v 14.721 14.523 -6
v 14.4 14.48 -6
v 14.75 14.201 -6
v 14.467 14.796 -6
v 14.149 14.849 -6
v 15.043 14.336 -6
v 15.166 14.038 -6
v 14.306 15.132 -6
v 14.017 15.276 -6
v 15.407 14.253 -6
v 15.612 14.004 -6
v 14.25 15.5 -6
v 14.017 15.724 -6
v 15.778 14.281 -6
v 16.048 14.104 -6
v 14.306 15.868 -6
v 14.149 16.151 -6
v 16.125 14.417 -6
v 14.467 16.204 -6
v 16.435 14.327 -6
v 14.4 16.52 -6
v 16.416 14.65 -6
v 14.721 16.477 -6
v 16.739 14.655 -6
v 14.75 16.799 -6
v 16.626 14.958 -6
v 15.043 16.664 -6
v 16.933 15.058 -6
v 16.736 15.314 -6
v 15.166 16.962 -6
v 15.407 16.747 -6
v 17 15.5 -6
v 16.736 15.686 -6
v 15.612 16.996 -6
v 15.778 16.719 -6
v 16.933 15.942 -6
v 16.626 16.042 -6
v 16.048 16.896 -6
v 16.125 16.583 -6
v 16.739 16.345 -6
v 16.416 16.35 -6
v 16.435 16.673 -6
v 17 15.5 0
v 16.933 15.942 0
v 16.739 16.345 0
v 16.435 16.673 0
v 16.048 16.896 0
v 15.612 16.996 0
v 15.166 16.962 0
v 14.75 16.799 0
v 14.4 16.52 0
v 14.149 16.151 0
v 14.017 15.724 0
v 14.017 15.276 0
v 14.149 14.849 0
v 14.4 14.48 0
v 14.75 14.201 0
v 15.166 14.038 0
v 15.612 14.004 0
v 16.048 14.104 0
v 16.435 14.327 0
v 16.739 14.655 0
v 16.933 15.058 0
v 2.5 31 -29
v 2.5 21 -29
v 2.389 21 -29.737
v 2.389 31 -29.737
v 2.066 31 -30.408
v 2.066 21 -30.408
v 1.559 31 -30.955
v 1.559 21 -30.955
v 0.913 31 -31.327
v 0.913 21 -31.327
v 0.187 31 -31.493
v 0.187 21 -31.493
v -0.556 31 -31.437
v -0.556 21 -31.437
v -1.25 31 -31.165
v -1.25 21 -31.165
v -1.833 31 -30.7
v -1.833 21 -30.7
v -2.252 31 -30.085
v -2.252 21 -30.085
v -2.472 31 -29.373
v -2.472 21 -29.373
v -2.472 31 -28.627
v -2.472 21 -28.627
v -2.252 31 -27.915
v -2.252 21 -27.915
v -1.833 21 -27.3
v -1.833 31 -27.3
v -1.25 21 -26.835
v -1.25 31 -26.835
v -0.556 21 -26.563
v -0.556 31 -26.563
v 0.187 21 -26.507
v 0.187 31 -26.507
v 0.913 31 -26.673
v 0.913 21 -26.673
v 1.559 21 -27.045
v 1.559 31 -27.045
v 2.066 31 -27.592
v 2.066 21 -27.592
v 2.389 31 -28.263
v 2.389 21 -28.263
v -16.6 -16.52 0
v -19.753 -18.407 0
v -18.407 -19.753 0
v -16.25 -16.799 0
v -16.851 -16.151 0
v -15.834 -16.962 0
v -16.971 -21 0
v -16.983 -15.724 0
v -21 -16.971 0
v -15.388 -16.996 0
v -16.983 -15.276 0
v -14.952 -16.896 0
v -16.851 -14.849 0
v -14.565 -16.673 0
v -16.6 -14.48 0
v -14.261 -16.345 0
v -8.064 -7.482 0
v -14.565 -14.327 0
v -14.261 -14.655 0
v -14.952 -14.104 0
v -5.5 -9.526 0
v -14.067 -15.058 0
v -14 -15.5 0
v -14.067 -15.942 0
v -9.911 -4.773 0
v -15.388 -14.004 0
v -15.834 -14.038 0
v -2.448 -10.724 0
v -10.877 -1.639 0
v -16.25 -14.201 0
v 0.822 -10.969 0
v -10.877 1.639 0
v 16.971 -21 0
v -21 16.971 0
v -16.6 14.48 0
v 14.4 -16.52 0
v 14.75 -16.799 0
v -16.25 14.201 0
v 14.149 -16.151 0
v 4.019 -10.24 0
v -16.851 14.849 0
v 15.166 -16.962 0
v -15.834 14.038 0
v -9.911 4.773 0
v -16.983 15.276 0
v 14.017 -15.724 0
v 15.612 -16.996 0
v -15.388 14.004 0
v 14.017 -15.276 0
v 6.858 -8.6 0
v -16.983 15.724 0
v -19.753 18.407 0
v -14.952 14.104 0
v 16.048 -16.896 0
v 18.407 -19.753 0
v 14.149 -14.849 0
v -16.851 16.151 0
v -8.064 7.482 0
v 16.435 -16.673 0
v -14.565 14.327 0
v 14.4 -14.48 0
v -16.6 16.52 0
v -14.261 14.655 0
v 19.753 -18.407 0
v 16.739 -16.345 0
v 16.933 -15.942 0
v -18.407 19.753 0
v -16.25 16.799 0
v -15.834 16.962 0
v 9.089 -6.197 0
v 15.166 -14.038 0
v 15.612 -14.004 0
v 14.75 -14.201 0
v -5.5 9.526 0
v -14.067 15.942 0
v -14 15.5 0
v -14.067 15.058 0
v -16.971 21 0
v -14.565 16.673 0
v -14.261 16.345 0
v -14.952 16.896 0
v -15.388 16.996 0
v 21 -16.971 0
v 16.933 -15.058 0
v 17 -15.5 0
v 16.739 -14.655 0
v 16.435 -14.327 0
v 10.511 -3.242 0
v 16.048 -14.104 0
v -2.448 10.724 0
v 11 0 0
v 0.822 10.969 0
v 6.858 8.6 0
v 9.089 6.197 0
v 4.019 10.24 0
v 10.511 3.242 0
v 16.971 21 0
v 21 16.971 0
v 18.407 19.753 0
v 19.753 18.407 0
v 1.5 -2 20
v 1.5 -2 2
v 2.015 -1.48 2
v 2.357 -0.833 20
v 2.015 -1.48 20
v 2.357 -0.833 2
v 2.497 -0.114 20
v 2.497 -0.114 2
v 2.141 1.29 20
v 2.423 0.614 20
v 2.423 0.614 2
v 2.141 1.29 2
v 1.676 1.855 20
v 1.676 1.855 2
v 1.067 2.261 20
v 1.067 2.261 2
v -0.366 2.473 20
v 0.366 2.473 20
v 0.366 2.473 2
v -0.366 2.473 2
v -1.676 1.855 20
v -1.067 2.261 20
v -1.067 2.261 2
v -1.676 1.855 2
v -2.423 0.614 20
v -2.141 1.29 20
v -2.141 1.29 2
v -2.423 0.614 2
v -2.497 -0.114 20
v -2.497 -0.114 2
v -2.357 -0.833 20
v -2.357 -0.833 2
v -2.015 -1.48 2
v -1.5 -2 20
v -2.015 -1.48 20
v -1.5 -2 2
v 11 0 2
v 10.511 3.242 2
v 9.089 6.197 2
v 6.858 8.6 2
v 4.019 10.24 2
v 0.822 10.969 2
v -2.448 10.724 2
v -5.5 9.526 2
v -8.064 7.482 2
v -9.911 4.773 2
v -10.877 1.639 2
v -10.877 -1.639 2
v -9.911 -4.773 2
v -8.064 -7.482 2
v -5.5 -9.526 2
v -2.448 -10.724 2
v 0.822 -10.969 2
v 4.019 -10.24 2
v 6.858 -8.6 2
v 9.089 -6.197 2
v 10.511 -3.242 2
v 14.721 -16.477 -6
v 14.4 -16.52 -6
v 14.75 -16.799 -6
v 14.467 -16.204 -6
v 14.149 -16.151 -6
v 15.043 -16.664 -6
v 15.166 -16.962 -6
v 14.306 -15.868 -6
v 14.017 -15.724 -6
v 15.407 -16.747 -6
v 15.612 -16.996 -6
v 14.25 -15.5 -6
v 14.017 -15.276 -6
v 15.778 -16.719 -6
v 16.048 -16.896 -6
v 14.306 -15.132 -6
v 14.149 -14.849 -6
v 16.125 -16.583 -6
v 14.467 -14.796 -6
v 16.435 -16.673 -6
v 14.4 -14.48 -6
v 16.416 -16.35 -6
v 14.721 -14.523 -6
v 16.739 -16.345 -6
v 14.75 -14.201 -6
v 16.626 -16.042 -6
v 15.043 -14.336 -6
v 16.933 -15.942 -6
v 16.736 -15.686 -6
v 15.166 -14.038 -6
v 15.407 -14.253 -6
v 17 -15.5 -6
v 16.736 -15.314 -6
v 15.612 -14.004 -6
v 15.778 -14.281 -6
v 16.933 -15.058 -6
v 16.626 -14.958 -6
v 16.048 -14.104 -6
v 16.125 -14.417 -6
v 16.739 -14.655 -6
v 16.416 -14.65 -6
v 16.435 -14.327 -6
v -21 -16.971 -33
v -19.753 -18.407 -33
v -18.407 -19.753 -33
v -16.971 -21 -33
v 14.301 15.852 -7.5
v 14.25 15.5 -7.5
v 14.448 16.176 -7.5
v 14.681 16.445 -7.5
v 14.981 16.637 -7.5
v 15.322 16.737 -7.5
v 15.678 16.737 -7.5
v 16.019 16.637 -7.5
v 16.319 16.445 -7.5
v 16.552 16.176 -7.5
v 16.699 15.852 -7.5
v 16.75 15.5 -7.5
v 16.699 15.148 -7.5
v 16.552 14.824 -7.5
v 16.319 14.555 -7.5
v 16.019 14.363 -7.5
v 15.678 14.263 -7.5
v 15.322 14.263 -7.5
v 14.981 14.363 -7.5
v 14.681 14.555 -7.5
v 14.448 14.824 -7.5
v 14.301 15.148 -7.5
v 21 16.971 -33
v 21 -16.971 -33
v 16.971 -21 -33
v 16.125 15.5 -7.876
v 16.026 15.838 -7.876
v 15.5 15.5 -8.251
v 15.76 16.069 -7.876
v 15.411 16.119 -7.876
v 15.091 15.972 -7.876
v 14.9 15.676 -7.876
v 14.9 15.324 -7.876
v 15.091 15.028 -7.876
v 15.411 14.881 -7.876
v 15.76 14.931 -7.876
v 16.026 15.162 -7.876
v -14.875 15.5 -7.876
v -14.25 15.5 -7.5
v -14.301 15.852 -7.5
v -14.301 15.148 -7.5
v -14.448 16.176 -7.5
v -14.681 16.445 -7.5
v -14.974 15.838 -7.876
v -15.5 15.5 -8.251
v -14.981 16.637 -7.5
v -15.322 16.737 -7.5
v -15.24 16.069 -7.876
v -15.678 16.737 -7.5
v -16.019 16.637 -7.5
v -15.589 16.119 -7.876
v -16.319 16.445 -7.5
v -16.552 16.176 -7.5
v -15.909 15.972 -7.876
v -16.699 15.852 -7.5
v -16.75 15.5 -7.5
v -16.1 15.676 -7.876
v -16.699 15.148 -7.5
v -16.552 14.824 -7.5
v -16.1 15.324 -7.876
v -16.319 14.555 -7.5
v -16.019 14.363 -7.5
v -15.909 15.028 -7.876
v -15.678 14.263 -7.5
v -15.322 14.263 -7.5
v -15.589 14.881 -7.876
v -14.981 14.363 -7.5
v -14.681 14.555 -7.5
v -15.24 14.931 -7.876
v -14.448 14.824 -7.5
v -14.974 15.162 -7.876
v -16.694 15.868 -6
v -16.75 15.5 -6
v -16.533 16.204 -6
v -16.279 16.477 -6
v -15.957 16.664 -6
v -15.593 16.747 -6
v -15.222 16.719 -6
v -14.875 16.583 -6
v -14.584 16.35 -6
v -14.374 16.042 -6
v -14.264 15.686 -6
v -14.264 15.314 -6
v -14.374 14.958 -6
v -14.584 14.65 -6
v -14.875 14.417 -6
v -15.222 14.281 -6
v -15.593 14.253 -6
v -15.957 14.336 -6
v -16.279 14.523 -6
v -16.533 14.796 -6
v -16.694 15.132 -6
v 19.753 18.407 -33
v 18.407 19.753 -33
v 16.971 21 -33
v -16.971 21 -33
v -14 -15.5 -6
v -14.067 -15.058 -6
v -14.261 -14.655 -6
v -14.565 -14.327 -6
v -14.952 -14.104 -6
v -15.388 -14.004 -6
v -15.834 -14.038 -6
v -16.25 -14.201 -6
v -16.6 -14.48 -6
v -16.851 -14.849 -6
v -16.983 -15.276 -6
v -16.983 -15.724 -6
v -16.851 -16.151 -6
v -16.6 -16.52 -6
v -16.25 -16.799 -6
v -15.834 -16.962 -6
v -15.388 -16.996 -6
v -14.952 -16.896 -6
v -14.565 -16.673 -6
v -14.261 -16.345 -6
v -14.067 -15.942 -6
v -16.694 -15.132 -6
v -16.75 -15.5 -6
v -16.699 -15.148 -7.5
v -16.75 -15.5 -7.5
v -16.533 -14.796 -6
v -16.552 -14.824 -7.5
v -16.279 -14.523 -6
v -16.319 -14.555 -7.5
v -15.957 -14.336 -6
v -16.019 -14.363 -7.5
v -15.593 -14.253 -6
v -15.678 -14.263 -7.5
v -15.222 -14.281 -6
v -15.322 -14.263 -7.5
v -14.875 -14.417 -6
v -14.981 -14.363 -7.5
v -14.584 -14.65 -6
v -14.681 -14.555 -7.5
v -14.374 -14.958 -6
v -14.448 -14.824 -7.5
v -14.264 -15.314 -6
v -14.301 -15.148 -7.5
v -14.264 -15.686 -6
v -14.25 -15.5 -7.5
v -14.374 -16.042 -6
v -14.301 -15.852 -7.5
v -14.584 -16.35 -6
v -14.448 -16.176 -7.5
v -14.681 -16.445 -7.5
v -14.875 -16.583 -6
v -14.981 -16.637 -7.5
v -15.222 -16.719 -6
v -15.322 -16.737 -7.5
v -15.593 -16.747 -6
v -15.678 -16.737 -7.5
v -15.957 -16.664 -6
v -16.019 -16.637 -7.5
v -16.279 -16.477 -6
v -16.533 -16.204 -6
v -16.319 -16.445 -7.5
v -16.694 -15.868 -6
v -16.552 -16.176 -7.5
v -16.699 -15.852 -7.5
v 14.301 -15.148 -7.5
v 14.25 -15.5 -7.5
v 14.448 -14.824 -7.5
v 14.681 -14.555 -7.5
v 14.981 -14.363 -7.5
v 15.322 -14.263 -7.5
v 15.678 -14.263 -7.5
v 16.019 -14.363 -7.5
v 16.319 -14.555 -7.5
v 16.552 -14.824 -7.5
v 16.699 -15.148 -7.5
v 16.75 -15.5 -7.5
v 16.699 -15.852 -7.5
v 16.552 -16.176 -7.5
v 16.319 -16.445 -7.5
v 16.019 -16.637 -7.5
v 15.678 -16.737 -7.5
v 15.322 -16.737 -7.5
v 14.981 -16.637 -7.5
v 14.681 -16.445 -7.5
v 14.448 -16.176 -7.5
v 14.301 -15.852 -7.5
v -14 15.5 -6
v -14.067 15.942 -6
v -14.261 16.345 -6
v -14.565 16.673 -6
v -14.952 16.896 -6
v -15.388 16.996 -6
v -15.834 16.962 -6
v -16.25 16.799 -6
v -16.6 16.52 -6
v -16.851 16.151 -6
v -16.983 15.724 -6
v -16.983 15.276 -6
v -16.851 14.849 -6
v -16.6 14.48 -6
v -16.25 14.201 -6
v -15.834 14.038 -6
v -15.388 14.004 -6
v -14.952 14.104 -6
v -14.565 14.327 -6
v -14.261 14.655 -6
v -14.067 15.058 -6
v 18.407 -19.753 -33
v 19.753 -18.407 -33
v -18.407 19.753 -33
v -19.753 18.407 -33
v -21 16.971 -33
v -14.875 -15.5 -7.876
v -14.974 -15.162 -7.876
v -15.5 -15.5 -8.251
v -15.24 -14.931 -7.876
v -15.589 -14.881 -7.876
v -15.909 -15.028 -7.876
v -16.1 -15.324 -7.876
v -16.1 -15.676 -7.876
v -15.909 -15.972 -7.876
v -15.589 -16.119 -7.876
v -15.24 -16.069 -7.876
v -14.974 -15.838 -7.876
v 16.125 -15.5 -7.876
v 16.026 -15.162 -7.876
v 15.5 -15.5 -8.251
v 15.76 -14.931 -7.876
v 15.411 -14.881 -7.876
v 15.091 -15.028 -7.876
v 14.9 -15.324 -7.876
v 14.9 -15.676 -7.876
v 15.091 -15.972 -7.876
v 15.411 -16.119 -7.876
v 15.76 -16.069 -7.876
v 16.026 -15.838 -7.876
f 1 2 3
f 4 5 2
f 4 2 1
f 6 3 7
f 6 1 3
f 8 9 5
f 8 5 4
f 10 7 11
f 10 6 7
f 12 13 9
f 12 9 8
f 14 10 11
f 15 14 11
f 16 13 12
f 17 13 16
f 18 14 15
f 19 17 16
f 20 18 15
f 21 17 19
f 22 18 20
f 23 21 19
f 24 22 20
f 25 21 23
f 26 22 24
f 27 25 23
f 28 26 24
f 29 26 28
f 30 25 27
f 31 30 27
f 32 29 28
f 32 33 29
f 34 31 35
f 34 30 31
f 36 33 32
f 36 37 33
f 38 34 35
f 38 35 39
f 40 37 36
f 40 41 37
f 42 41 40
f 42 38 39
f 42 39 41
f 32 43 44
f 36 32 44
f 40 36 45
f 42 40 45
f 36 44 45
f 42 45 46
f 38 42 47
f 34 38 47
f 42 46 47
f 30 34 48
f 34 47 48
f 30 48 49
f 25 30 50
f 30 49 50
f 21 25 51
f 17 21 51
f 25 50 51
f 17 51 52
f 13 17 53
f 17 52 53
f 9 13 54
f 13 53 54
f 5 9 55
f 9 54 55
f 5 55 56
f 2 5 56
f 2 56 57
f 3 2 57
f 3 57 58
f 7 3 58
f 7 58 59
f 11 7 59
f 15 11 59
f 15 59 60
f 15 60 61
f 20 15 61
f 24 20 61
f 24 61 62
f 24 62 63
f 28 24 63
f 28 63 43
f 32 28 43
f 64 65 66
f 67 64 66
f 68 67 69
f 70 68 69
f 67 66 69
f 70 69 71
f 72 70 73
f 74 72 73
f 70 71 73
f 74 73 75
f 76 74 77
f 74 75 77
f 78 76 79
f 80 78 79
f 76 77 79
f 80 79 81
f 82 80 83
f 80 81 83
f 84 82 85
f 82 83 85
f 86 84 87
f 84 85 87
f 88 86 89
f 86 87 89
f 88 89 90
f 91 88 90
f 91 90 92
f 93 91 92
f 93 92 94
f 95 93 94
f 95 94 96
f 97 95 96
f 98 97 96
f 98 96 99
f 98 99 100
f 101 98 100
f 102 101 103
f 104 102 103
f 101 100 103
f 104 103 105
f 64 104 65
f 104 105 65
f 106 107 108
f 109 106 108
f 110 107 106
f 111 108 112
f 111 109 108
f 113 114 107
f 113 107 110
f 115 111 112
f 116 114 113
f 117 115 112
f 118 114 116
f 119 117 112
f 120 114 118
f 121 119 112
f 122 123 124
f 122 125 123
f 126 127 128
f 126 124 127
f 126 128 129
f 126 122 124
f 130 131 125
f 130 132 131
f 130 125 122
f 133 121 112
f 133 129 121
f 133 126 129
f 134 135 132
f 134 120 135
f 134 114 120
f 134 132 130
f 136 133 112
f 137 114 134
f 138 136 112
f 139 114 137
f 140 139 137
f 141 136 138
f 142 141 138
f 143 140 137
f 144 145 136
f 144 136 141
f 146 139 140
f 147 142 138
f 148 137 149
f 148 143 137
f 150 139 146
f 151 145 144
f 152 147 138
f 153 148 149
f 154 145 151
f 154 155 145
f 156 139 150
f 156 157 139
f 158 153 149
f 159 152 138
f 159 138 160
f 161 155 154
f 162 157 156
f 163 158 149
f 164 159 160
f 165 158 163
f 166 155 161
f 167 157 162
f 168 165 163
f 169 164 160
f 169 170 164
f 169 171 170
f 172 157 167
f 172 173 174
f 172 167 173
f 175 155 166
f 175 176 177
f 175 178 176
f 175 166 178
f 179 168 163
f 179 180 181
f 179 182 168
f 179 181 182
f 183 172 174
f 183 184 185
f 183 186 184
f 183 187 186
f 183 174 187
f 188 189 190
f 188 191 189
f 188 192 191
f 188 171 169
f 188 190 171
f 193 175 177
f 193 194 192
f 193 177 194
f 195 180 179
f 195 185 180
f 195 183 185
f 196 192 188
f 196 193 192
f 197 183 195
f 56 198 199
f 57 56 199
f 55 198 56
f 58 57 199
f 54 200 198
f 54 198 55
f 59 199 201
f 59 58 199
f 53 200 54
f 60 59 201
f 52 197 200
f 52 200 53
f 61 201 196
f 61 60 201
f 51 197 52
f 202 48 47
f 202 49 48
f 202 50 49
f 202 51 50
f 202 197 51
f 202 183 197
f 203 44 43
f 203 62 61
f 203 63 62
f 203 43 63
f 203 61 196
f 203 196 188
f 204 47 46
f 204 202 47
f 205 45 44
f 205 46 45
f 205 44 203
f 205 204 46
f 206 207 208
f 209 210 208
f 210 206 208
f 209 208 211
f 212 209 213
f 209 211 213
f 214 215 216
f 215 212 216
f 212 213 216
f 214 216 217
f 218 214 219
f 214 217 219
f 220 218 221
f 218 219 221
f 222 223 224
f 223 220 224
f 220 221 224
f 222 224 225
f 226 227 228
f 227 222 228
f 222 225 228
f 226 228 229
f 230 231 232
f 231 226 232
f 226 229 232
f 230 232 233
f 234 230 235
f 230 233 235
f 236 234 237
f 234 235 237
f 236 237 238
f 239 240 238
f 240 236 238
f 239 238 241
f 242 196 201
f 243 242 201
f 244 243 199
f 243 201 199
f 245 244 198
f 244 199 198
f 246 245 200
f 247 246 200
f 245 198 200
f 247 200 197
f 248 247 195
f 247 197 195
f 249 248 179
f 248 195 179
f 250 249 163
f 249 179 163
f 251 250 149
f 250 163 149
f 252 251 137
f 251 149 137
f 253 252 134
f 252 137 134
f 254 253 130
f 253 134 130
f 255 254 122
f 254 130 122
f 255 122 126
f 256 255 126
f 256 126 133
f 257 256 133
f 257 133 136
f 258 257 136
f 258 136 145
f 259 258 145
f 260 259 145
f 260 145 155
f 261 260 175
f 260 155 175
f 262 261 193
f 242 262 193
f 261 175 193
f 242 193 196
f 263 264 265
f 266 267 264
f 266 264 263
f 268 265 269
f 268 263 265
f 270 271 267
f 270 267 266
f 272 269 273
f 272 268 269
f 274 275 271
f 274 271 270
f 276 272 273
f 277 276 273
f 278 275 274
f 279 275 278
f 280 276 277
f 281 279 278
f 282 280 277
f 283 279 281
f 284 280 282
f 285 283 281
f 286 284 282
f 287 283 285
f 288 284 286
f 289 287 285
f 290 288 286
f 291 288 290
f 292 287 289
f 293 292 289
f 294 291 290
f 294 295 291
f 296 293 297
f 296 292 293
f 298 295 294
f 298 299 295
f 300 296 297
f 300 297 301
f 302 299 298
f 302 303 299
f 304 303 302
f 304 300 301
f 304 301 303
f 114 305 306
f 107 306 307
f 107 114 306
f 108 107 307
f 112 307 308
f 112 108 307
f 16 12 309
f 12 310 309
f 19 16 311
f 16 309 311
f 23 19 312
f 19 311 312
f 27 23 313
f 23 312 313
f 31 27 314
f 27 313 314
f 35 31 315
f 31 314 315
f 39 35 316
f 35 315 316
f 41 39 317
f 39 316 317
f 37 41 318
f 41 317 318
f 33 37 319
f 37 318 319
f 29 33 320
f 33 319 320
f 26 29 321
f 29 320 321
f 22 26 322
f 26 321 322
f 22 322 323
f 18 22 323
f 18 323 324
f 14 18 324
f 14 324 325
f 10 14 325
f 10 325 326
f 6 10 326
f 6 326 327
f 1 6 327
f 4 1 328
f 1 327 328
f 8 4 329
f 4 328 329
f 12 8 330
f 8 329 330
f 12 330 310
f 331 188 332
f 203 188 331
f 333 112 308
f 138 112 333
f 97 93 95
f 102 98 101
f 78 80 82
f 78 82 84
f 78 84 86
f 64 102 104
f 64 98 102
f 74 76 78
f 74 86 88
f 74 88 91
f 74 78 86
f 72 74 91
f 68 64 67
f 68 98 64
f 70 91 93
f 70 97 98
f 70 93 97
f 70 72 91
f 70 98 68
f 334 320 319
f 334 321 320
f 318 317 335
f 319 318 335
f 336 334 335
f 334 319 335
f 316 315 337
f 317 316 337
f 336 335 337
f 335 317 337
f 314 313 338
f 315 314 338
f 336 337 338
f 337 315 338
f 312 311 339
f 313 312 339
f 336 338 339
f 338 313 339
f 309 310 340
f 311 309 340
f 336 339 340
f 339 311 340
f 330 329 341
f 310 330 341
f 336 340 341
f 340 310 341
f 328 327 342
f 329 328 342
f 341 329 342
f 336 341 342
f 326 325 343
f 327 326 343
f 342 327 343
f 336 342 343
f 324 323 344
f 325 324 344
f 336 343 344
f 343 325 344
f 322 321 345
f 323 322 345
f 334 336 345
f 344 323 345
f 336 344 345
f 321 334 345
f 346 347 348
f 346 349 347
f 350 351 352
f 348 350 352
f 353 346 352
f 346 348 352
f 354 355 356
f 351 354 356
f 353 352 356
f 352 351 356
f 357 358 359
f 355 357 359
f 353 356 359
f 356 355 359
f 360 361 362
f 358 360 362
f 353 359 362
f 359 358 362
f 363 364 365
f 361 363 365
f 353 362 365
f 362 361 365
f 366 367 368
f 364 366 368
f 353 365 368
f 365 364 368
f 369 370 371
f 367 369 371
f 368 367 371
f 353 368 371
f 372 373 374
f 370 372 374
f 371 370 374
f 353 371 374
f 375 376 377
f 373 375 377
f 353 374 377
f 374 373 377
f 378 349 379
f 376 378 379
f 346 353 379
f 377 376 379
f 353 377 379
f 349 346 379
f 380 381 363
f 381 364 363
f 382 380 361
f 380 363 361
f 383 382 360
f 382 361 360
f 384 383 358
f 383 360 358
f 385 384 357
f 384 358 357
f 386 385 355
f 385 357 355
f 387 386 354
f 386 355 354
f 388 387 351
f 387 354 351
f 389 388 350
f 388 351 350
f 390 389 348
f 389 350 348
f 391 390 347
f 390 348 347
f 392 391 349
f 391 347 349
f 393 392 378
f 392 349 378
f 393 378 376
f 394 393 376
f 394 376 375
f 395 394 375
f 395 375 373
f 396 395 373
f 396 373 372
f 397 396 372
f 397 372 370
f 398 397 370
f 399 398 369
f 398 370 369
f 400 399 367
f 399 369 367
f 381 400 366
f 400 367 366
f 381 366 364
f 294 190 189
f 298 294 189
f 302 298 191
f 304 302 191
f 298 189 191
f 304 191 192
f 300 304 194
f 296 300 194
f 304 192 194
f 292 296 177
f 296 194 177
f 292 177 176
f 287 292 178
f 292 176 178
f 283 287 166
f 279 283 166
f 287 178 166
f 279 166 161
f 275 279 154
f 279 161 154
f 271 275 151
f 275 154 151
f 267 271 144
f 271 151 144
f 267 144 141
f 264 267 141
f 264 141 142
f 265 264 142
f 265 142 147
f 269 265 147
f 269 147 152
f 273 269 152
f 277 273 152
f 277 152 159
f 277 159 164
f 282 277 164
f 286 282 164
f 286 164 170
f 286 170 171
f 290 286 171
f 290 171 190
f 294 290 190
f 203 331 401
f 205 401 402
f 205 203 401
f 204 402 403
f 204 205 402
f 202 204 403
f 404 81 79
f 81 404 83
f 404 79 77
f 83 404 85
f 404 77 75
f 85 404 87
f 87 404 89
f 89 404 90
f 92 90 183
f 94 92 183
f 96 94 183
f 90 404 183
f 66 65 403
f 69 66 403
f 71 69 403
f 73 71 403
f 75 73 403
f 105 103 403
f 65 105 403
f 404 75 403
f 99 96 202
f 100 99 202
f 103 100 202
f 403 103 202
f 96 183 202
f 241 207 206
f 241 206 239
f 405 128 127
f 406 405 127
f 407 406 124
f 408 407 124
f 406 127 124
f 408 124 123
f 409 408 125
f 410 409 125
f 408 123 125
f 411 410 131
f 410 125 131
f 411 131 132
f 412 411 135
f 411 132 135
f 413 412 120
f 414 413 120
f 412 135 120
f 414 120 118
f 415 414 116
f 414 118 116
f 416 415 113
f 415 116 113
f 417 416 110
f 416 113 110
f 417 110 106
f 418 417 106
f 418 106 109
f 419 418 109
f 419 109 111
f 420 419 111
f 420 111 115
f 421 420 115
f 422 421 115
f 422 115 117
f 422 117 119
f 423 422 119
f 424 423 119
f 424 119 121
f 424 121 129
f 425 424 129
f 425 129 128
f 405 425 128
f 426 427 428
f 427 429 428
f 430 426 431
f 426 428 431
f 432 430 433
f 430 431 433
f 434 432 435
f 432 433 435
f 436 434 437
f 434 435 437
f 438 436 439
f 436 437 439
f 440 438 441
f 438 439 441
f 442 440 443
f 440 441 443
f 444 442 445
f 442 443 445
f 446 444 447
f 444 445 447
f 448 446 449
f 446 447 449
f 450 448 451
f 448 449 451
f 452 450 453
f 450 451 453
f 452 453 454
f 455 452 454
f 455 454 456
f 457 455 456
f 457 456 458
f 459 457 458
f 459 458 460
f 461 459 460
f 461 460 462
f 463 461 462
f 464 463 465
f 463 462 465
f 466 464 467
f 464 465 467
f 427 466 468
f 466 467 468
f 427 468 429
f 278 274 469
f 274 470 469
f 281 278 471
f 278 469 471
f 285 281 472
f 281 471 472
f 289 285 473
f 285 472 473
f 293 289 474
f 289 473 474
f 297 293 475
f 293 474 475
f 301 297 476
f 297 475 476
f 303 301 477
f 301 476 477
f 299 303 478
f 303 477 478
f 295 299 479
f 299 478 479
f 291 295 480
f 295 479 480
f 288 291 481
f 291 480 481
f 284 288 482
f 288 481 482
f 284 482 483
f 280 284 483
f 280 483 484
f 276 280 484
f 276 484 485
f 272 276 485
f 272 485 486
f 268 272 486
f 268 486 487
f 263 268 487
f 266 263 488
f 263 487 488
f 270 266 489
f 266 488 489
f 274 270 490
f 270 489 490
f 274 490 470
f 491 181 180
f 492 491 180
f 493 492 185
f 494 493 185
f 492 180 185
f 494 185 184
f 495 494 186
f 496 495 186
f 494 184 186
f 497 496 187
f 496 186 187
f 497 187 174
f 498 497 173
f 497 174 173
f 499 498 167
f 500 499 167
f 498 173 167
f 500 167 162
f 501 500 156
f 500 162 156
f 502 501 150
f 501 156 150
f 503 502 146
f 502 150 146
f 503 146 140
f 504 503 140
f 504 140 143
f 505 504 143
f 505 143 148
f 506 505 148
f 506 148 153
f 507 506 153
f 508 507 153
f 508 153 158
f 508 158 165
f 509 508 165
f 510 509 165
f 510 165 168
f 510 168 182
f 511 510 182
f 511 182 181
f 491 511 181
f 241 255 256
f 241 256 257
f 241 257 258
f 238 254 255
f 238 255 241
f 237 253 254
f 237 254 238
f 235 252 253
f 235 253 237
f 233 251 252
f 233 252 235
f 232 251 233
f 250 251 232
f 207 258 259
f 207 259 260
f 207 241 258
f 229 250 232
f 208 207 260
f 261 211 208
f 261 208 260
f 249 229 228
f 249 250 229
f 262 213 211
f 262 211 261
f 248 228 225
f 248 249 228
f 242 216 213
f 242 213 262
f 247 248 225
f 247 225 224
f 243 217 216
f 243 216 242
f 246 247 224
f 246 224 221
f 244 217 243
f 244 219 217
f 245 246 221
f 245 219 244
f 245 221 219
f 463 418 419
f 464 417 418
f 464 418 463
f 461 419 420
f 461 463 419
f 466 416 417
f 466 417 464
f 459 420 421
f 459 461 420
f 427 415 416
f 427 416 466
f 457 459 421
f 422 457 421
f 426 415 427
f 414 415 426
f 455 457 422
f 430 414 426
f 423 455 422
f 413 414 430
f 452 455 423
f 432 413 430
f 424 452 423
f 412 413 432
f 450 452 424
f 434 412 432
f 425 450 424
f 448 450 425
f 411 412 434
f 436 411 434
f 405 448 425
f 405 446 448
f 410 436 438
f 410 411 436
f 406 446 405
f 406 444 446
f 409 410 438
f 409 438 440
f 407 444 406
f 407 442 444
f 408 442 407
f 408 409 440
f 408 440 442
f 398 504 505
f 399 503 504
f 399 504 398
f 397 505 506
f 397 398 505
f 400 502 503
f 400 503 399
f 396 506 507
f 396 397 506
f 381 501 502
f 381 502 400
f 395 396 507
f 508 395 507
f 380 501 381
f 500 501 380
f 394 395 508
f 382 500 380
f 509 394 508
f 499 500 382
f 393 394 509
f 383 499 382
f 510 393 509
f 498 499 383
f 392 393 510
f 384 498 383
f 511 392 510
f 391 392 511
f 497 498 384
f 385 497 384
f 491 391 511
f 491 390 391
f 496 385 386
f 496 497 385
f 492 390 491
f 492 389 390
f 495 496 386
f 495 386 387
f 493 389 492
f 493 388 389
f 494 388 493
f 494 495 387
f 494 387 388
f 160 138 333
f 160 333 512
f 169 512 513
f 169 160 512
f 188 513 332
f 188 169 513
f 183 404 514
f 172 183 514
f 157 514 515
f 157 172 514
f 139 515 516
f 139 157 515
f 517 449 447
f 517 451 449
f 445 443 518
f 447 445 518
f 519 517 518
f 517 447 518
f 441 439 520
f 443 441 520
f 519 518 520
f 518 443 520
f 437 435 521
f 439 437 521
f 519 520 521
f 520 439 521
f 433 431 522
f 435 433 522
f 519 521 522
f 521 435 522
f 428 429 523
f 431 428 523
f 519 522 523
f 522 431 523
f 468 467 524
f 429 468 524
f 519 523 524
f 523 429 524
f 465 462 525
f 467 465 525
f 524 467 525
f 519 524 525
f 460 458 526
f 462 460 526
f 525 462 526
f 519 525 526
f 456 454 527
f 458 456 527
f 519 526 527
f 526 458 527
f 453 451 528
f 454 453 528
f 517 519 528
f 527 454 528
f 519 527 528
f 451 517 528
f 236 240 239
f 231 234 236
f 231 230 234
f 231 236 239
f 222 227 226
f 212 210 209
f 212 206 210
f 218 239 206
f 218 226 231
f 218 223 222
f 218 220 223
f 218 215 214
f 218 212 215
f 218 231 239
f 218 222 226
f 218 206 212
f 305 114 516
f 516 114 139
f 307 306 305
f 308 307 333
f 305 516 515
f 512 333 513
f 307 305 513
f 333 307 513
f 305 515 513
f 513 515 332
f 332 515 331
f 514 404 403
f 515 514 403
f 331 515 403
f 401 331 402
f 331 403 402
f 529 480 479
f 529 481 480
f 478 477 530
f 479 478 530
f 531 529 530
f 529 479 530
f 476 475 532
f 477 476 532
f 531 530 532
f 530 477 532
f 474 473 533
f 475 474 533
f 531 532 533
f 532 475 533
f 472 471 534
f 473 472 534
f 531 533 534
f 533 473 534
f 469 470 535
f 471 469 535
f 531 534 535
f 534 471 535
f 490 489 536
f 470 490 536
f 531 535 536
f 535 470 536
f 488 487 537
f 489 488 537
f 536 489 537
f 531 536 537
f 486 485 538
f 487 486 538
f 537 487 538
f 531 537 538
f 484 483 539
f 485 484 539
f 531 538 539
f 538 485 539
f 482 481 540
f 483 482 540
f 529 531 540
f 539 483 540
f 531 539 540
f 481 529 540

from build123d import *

# Parameters (mm, degrees)
SKETCH_1_W                   = 42
SKETCH_1_H                   = 42
EXTRUDE_1_DEPTH              = 33
SKETCH_2_R                   = 11
EXTRUDE_2_DEPTH              = 2
SKETCH_3_R                   = 2.5
EXTRUDE_3_DEPTH              = 18
CUT_EXTRUDE_2_DEPTH          = 18
HOLE_WIZARD_M3_1_D           = 2.5
HOLE_WIZARD_M3_1_DEPTH       = 7.5
HOLE_WIZARD_M3_1_CBORE_D     = 3
HOLE_WIZARD_M3_1_CBORE_DEPTH = 6
HOLE_WIZARD_M3_1_TIP         = 0.751075774
SKETCH_7_OUTSIDE_W           = 59.922
SKETCH_7_OUTSIDE_H           = 59.922
SKETCH_7_OUTSIDE_R           = 27
CUT_EXTRUDE_3_DEPTH          = 34
SKETCH_8_R                   = 2.5
EXTRUDE_4_DEPTH              = 10


with BuildPart() as part:
    # 草圖1 → 填料-伸長1 (new body)
    with BuildSketch(Plane.XY):
        Rectangle(SKETCH_1_W, SKETCH_1_H)
    extrude(amount=-EXTRUDE_1_DEPTH)

    # 草圖2 → 填料-伸長2 (add)
    with BuildSketch(Plane.XY):
        Circle(SKETCH_2_R)
    extrude(amount=EXTRUDE_2_DEPTH)

    # 草圖3 → 填料-伸長3 (add)
    with BuildSketch(Plane.XY.offset(2)):
        Circle(SKETCH_3_R)
    extrude(amount=EXTRUDE_3_DEPTH)

    # 草圖4 → 除料-伸長2 (cut)
    with BuildSketch(Plane.XY.offset(20)):
        with BuildLine():
            Line((1.5, -2), (-1.5, -2))
            ThreePointArc((-1.5, -2), (0, -2.5), (1.5, -2))
        make_face()
    extrude(amount=-CUT_EXTRUDE_2_DEPTH, mode=Mode.SUBTRACT)

    # M3 螺紋孔1
    with Locations(Plane.XY):
        with Locations((-15.5, 15.5), (15.5, 15.5), (15.5, -15.5), (-15.5, -15.5)):
            CounterBoreHole(HOLE_WIZARD_M3_1_D / 2, HOLE_WIZARD_M3_1_CBORE_D / 2, HOLE_WIZARD_M3_1_CBORE_DEPTH, depth=HOLE_WIZARD_M3_1_DEPTH)
            with Locations((0, 0, -(HOLE_WIZARD_M3_1_DEPTH + HOLE_WIZARD_M3_1_TIP / 2))):  # 118° drill point
                Cone(0, HOLE_WIZARD_M3_1_D / 2, HOLE_WIZARD_M3_1_TIP, mode=Mode.SUBTRACT)

    # 草圖7 outside → 除料-伸長3 (cut, through all)
    with BuildSketch(Plane.XY):
        Rectangle(SKETCH_7_OUTSIDE_W, SKETCH_7_OUTSIDE_H)
        Circle(SKETCH_7_OUTSIDE_R, mode=Mode.SUBTRACT)
    extrude(amount=-CUT_EXTRUDE_3_DEPTH, mode=Mode.SUBTRACT)

    # 草圖8 → 填料-伸長4 (add)
    with BuildSketch(Plane(origin=(0, 21, 0), x_dir=(1, 0, 0), z_dir=(0, 1, 0))):
        with Locations((0, 29)):
            Circle(SKETCH_8_R)
    extrude(amount=EXTRUDE_4_DEPTH)


solid = part.part
